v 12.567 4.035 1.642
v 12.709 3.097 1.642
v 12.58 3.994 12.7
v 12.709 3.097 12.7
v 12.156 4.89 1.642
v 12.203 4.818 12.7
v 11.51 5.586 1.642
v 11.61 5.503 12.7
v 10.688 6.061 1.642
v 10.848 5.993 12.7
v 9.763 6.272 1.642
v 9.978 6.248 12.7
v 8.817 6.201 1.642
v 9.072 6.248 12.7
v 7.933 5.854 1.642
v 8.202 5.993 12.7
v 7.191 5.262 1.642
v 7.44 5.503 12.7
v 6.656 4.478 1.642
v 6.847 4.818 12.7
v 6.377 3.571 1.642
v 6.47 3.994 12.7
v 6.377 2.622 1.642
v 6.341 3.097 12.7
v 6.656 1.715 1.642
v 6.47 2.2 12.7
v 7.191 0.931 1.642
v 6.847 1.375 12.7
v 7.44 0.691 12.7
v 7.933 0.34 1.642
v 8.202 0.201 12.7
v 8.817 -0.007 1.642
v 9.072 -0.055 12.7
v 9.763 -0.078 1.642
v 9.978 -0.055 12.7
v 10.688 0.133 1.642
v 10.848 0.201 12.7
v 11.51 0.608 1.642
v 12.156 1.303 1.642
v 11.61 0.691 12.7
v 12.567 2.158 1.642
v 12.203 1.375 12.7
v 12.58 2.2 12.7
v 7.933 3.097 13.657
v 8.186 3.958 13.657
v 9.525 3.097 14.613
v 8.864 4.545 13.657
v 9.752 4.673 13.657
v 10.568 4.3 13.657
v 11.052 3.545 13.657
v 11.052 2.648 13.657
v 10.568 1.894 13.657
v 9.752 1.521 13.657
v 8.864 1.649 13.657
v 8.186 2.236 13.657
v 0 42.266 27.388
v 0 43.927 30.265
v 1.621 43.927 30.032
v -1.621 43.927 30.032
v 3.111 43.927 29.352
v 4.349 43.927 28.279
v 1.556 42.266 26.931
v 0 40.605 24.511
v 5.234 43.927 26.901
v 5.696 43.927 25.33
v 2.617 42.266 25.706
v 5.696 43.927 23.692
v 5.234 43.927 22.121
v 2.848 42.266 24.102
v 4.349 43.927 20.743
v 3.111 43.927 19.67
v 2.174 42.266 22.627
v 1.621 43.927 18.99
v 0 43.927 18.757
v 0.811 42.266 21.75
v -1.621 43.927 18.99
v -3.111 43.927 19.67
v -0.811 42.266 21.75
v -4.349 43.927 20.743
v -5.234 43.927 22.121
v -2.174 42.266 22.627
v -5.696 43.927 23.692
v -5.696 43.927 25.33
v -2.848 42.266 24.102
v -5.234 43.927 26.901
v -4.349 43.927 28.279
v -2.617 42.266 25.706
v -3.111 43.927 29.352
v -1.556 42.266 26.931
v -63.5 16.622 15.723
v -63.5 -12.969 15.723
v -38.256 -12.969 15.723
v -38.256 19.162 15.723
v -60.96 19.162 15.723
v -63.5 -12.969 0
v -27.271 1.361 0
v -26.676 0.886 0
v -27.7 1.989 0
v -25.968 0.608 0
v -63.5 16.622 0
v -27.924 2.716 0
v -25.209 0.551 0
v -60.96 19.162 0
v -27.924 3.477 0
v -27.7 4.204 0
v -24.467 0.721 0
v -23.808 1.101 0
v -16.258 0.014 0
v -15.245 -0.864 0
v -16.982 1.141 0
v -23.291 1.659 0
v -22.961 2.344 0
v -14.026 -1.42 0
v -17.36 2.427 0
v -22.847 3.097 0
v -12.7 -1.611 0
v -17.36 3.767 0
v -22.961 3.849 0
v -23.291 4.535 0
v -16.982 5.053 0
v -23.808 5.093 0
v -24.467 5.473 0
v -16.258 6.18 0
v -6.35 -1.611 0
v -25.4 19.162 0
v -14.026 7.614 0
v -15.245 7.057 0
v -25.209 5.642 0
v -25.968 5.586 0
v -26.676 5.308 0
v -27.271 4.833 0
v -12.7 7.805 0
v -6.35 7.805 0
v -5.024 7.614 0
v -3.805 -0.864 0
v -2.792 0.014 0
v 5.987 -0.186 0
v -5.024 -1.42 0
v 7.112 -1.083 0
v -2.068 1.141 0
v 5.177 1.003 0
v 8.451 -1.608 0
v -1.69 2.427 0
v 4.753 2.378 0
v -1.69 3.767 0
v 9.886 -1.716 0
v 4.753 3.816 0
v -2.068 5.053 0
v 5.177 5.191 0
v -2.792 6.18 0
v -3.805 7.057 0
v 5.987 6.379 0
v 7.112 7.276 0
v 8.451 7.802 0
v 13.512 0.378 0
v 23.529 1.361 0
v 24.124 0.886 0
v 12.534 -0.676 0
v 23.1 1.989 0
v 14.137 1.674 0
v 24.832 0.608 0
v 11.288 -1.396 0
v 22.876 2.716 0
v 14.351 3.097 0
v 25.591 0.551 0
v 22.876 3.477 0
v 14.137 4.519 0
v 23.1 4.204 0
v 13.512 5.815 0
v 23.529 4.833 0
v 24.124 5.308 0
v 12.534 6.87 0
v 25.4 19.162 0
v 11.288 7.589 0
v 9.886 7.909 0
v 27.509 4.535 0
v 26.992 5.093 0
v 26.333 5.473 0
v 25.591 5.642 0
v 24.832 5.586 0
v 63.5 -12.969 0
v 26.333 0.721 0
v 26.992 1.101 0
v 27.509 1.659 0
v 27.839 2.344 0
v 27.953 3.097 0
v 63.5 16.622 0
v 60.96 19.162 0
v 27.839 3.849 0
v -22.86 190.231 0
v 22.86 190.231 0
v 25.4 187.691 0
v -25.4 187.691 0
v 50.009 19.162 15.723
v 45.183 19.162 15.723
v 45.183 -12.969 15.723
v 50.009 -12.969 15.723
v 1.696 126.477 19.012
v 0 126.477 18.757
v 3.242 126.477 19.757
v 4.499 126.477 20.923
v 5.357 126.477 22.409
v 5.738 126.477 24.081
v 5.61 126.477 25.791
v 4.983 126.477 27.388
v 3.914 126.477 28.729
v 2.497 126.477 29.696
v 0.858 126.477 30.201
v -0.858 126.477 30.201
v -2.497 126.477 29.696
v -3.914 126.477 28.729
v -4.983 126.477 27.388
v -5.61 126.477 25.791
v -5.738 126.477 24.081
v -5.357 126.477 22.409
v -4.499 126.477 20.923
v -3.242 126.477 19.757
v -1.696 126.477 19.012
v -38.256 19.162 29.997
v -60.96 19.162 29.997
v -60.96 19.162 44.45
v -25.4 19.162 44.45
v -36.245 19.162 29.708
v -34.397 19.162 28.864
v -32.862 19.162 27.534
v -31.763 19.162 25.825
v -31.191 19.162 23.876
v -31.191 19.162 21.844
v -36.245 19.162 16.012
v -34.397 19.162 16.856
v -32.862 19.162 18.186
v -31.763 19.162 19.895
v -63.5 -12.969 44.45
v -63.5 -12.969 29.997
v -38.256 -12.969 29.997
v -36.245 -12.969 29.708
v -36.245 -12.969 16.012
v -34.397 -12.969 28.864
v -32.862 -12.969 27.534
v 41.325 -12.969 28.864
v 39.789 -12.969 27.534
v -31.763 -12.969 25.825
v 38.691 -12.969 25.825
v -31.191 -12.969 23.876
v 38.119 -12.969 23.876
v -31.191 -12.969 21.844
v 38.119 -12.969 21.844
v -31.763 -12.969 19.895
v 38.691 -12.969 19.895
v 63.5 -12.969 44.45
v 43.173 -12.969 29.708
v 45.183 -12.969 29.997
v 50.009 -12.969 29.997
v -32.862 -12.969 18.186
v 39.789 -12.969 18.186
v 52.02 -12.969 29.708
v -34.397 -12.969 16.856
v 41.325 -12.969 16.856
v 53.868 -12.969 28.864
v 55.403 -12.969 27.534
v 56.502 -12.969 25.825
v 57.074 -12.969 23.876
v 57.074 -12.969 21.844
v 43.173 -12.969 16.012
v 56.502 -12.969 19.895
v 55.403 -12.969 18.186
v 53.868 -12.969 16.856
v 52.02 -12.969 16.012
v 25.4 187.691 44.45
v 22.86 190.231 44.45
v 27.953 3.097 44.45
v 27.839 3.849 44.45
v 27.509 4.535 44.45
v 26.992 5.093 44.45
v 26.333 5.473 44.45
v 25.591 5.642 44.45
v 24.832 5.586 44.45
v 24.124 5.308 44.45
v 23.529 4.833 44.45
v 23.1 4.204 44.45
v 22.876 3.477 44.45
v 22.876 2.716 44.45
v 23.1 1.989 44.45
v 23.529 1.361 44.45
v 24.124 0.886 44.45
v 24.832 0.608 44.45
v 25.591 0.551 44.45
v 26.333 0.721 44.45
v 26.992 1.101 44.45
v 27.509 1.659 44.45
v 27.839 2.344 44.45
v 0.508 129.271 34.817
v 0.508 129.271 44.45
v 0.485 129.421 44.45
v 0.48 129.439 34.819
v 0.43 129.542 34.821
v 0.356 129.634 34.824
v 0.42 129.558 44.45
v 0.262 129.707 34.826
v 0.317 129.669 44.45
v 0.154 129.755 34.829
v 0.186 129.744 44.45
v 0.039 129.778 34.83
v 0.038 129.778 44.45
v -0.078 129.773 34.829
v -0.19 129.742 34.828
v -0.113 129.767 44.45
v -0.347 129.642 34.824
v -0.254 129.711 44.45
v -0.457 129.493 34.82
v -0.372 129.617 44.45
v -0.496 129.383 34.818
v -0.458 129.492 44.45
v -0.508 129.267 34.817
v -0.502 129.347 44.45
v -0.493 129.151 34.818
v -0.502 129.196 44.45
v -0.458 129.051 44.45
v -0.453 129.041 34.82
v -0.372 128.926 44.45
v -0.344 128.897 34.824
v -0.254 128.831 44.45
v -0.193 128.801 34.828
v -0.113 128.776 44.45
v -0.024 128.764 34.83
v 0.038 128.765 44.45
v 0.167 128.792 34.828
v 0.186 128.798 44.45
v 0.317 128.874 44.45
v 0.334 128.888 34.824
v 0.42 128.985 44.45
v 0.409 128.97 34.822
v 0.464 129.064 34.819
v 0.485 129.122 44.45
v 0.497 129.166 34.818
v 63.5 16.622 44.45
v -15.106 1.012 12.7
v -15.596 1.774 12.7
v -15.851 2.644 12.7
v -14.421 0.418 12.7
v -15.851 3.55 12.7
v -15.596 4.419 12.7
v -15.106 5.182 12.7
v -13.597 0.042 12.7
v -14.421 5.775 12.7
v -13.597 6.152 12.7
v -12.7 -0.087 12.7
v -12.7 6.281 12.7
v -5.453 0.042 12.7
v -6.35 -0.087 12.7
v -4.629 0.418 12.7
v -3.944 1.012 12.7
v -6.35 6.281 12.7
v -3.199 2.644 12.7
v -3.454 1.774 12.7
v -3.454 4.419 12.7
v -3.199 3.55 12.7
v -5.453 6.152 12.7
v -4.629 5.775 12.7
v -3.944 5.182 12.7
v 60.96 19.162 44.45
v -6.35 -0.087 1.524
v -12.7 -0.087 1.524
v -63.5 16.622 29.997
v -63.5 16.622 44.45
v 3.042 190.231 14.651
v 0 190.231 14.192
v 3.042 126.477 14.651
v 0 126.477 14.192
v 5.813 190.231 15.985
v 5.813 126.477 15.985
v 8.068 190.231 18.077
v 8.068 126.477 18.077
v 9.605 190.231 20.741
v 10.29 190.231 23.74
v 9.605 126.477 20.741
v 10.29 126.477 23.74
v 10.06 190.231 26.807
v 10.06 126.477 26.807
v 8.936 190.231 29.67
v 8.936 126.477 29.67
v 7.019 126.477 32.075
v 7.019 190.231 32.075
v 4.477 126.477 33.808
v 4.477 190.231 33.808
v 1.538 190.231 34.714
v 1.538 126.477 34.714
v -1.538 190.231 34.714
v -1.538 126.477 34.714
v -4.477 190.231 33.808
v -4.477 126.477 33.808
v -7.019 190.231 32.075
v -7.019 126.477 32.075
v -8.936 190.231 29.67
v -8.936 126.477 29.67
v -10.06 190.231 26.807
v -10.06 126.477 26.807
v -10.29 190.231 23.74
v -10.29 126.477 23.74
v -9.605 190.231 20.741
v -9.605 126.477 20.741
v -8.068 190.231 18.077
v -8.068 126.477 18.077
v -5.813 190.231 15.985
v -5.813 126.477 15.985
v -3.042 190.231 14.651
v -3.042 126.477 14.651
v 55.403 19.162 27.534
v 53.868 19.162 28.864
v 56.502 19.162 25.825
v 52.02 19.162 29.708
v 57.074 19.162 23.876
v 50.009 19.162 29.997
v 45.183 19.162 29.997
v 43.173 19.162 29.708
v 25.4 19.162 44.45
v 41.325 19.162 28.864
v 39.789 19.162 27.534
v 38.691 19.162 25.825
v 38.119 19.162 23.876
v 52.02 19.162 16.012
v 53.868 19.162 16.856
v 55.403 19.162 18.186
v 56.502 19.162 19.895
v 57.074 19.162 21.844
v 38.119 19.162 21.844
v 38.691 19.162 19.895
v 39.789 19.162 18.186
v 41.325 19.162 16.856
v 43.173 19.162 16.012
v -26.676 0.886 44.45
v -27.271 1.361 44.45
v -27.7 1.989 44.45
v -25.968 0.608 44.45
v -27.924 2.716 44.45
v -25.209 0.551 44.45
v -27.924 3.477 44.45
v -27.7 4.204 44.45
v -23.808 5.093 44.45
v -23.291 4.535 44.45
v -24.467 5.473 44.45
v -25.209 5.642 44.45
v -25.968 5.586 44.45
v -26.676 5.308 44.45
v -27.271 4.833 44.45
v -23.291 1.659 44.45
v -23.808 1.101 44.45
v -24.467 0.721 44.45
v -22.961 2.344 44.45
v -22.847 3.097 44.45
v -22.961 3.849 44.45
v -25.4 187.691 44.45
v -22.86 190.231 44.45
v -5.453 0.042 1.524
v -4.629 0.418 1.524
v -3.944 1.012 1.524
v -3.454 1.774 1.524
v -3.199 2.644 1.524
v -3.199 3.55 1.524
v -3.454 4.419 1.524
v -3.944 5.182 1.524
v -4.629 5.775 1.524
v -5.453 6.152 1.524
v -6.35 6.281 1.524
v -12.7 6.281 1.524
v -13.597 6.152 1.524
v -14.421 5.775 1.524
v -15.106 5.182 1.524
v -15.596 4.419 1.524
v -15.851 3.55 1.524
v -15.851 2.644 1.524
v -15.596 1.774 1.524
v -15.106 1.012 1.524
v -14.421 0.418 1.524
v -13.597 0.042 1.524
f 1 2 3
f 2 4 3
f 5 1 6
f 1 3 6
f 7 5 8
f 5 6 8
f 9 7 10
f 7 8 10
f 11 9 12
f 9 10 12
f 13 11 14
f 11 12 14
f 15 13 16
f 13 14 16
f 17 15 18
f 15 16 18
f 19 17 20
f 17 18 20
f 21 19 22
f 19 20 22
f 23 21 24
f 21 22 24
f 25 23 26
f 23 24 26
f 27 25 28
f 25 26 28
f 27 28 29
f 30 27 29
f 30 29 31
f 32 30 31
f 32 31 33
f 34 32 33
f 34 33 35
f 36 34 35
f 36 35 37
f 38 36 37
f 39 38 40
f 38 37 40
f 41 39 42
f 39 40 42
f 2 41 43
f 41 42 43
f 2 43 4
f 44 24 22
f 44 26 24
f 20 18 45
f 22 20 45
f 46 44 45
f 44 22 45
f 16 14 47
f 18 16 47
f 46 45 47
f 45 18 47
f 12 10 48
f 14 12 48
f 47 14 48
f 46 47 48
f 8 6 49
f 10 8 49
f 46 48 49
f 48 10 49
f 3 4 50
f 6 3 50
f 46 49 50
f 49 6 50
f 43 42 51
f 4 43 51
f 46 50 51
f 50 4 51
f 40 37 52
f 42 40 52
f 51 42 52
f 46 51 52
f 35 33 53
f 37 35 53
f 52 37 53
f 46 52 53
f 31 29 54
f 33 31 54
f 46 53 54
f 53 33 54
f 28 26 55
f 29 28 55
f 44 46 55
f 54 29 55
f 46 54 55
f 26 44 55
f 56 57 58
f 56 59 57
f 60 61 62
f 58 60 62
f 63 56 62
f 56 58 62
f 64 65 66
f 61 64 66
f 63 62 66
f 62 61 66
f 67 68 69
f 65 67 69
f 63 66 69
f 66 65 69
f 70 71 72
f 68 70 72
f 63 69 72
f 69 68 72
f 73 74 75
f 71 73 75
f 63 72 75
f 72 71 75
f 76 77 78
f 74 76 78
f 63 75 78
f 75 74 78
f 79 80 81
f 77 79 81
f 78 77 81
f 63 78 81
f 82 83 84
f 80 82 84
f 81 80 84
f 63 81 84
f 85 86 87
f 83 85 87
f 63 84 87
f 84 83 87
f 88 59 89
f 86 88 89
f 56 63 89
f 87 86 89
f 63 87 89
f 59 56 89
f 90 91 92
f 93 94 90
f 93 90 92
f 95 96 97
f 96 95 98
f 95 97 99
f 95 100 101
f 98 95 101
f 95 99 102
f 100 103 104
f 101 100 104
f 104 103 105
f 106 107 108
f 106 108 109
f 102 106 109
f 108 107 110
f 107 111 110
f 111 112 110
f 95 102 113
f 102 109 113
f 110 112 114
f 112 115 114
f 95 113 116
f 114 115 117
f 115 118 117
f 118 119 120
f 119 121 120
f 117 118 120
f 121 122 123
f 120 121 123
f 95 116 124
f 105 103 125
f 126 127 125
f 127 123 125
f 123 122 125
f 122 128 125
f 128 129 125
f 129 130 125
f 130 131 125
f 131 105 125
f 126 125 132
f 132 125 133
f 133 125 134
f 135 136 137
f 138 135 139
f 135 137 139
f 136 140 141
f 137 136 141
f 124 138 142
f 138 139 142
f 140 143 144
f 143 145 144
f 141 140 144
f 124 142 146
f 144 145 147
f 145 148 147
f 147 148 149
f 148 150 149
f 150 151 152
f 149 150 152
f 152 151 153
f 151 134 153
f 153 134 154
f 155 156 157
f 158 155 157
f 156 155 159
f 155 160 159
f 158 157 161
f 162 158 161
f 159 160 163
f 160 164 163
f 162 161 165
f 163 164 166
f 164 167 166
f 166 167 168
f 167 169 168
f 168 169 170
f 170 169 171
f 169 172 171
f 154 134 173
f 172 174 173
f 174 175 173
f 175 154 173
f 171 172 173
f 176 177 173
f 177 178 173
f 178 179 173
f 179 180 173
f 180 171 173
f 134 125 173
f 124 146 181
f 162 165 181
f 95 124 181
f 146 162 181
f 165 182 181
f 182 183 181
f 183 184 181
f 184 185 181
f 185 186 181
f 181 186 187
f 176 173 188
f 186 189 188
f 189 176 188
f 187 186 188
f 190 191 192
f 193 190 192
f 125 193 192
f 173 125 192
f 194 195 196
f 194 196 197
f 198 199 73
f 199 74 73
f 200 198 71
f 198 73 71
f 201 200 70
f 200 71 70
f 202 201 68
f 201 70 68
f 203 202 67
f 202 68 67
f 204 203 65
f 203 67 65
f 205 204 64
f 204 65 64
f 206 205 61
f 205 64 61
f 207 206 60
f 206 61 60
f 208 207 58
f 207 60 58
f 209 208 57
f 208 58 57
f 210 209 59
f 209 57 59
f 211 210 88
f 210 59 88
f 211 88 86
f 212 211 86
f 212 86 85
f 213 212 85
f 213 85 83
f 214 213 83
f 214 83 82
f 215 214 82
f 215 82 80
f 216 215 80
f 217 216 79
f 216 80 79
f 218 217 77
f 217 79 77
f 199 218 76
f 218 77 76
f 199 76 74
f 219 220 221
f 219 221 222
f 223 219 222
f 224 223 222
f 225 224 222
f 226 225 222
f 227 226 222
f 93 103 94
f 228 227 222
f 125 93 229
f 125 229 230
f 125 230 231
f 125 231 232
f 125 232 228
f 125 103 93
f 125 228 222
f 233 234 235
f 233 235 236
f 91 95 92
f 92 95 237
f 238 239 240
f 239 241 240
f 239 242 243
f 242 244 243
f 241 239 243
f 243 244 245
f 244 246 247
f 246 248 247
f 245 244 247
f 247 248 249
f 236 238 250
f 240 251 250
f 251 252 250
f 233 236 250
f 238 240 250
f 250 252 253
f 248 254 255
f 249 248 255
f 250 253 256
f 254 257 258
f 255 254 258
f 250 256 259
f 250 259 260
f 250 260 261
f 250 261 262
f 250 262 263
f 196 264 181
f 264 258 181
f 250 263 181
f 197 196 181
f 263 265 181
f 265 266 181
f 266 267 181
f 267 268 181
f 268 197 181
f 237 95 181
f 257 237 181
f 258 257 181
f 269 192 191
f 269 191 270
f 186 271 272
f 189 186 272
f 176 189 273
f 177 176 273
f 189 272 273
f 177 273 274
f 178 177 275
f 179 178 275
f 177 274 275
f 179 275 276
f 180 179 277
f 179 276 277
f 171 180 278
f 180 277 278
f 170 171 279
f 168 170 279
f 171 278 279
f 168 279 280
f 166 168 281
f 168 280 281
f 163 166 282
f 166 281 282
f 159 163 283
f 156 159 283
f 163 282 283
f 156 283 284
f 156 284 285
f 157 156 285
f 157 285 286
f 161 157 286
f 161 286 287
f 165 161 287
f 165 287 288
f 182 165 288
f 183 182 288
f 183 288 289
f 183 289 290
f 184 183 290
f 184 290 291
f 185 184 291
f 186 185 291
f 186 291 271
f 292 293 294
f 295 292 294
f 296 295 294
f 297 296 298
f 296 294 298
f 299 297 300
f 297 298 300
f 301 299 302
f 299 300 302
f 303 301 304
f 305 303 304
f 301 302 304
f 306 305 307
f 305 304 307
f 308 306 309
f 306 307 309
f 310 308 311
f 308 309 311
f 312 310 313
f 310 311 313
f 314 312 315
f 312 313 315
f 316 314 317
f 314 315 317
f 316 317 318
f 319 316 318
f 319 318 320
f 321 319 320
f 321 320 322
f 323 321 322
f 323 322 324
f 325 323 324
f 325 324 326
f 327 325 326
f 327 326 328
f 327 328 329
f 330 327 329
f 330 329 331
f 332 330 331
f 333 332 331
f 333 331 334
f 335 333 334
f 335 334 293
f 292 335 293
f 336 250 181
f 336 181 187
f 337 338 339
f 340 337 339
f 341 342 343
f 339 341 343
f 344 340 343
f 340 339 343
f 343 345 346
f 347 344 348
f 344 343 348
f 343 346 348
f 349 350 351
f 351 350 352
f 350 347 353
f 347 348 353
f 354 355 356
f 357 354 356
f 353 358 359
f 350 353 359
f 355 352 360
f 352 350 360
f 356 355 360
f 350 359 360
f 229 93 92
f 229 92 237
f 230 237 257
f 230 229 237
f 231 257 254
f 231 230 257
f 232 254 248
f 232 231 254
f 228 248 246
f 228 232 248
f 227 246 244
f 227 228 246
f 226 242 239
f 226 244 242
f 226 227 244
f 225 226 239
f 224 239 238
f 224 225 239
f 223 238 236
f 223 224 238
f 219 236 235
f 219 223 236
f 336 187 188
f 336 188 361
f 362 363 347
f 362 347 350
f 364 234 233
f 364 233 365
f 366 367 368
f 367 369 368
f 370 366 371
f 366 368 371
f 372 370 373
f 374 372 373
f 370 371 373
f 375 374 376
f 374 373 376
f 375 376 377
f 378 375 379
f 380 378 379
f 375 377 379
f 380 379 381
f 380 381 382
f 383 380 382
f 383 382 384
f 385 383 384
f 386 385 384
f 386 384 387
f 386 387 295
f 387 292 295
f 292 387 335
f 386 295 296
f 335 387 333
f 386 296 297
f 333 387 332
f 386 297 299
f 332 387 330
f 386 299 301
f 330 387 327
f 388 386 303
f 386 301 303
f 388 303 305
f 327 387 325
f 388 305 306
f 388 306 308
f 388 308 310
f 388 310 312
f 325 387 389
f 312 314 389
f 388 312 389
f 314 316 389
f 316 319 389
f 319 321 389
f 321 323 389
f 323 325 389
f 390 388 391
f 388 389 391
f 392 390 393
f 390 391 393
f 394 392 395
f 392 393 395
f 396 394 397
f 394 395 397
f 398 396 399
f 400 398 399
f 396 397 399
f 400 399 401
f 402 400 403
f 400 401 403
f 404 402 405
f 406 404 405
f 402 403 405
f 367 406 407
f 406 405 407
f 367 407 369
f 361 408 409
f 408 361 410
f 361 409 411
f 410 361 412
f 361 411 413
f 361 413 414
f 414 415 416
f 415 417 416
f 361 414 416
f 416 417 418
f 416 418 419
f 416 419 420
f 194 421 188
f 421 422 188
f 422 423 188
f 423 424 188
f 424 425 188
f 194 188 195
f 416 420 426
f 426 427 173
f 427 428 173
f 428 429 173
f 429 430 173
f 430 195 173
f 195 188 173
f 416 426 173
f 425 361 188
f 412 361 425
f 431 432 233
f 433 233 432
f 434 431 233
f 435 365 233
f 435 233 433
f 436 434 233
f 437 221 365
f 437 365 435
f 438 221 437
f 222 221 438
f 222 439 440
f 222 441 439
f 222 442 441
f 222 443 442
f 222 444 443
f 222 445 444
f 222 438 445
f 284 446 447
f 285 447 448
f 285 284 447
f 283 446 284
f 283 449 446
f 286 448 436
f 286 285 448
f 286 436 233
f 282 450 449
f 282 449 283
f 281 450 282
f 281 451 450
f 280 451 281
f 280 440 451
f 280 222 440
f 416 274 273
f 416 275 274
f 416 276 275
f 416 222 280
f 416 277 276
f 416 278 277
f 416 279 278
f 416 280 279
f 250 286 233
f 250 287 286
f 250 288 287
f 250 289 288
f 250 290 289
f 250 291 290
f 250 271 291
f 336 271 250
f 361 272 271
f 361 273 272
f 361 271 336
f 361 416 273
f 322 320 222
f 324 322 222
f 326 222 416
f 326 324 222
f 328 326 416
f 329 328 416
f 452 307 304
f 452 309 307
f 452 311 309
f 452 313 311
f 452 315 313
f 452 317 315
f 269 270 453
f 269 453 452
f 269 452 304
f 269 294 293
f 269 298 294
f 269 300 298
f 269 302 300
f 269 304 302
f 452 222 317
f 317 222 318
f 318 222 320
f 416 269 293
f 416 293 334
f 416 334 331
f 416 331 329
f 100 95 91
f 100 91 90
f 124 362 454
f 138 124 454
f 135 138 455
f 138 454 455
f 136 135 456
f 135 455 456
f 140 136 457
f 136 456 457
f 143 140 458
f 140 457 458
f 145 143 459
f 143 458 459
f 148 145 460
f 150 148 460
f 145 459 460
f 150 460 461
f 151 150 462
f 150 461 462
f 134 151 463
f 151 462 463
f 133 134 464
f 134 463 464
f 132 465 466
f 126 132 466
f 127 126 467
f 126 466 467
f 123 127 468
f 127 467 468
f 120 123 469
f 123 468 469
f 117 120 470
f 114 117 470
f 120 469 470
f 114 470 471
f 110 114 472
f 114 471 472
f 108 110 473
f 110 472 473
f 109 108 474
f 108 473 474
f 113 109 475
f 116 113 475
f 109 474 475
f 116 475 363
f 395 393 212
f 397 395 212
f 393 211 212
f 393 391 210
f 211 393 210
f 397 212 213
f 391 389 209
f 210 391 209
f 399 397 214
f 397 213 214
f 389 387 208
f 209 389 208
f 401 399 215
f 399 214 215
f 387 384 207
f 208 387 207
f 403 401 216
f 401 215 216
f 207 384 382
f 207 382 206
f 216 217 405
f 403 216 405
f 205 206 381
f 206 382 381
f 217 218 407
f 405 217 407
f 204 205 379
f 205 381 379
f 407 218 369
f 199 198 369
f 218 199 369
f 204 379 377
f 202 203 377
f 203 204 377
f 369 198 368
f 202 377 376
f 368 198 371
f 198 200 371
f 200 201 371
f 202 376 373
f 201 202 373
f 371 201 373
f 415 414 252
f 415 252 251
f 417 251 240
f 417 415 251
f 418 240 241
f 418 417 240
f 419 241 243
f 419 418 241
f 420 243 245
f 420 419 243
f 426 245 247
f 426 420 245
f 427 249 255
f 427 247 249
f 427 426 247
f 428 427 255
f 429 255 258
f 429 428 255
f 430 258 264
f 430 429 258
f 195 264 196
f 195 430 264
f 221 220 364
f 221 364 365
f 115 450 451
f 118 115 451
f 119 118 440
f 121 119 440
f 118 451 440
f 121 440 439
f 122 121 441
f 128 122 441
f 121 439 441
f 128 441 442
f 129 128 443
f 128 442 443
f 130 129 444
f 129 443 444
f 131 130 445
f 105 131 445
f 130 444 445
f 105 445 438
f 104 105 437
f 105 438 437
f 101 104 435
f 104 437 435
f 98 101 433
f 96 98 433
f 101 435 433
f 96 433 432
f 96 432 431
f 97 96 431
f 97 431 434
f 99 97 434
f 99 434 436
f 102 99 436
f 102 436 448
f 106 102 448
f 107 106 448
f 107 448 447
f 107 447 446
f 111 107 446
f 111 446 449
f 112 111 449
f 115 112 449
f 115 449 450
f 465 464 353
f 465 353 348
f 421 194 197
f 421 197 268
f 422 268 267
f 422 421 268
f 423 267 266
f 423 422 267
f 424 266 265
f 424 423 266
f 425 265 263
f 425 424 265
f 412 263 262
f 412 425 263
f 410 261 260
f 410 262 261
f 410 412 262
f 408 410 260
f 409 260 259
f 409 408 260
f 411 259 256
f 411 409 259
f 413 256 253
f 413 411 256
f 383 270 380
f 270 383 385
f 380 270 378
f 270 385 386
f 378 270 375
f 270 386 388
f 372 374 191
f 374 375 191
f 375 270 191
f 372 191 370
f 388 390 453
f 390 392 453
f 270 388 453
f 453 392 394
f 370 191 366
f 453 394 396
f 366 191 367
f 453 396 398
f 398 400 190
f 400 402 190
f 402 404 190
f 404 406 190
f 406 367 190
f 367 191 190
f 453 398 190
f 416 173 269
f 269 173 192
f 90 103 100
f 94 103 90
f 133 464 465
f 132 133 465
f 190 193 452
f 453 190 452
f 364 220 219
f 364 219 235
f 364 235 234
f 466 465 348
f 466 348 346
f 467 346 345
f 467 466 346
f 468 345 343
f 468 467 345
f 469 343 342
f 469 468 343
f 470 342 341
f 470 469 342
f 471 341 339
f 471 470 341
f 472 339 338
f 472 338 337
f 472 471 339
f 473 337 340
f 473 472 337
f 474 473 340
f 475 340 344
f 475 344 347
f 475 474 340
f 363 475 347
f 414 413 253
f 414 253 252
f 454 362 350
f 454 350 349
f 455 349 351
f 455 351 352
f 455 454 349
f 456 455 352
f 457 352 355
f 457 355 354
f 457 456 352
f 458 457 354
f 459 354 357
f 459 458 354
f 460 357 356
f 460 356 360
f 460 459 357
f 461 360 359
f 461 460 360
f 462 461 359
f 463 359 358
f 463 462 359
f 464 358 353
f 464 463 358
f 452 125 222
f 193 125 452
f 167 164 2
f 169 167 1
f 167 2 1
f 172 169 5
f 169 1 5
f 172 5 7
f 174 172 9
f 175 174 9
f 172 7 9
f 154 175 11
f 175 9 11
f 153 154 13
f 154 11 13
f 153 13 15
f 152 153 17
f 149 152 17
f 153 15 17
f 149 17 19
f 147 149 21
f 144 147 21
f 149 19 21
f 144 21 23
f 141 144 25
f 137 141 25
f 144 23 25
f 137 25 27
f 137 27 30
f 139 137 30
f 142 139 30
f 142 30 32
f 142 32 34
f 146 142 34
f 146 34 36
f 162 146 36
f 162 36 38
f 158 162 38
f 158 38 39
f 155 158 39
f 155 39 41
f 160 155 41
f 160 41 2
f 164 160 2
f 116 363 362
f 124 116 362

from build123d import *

# Parameters (mm, degrees)
EXTRUDE1_DEPTH                        = 44.45
CHAMFER1_SIZE                         = 2.54
CHAMFER2_SIZE                         = 2.54
F_13_16_0_8125_DIAMETER_HOLE1_D       = 20.6375
F_13_16_0_8125_DIAMETER_HOLE1_DEPTH   = 63.754
F_1_2_20_TAPPED_HOLE1_D               = 11.50874
F_1_2_20_TAPPED_HOLE1_DEPTH           = 82.55
F_1_2_20_TAPPED_HOLE1_TIP             = 3.322287069
F_60_0_04_DIAMETER_HOLE1_REACH        = 46.45
F_60_0_04_DIAMETER_HOLE1_BORE_R       = 0.508
F_1_4_20_TAPPED_HOLE1_D               = 5.1054
F_1_4_0_25_DIAMETER_HOLE2_D           = 6.36778
F_1_4_0_25_DIAMETER_HOLE2_DEPTH       = 12.7
F_1_4_0_25_DIAMETER_HOLE2_CSINK_D     = 9.652
F_1_4_0_25_DIAMETER_HOLE2_CSINK_ANGLE = 90
F_1_4_0_25_DIAMETER_HOLE2_TIP         = 1.913074116
EXTRUDE4_DEPTH                        = 12.7
CHAMFER3_SIZE                         = 1.524
EXTRUDE5_DEPTH                        = 33.131


with BuildPart() as part:
    # Sketch1 → Extrude1 (new body)
    with BuildSketch(Plane.XY):
        Polygon((-63.5, 19.16234013), (-25.4, 19.16234013), (-25.4, 190.23134013), (0, 190.23134013), (0, -12.96865987), (-63.5, -12.96865987), align=None)
    extrude1 = extrude(amount=EXTRUDE1_DEPTH)

    # Mirror2: Extrude1 across plane
    add(extrude1.mirror(Plane(origin=(0, -12.96865987, 44.45), x_dir=(0, 0, 1), z_dir=(-1, 0, 0))))

    # Chamfer1
    chamfer1_edges = [part.edges().sort_by_distance(p)[0] for p in [
        (63.5, 19.16234013, 22.225),
        (25.4, 190.23134013, 22.225),
    ]]
    chamfer(chamfer1_edges, length=CHAMFER1_SIZE)

    # Chamfer2
    chamfer2_edges = [part.edges().sort_by_distance(p)[0] for p in [
        (-63.5, 19.16234013, 22.225),
        (-25.4, 190.23134013, 22.225),
    ]]
    chamfer(chamfer2_edges, length=CHAMFER2_SIZE)

    # 13/16 (0.8125) Diameter Hole1
    with Locations(Plane(origin=(0, 190.23134013, 24.511), x_dir=(0, 0, 1), z_dir=(0, 1, 0))):
        with Locations((0, 0)):
            Hole(F_13_16_0_8125_DIAMETER_HOLE1_D / 2, depth=F_13_16_0_8125_DIAMETER_HOLE1_DEPTH)

    # 1/2-20 Tapped Hole1
    with Locations(Plane(origin=(0, 126.47734013, 24.511), x_dir=(0, 0, 1), z_dir=(0, 1, 0))):
        with Locations((0, 0)):
            Hole(F_1_2_20_TAPPED_HOLE1_D / 2, depth=F_1_2_20_TAPPED_HOLE1_DEPTH)
            with Locations((0, 0, -(F_1_2_20_TAPPED_HOLE1_DEPTH + F_1_2_20_TAPPED_HOLE1_TIP / 2))):  # 120° drill point
                Cone(0, F_1_2_20_TAPPED_HOLE1_D / 2, F_1_2_20_TAPPED_HOLE1_TIP, mode=Mode.SUBTRACT)

    # #60 (0.04) Diameter Hole1 bore → #60 (0.04) Diameter Hole1 (cut, up to next)
    with BuildSketch(Plane.XY.offset(44.45), mode=Mode.PRIVATE) as f_60_0_04_diameter_hole1_sk1:
        with Locations((0, 129.27134013)):
            Circle(F_60_0_04_DIAMETER_HOLE1_BORE_R)
    f_60_0_04_diameter_hole1_tool1 = extrude(f_60_0_04_diameter_hole1_sk1.sketch, amount=-F_60_0_04_DIAMETER_HOLE1_REACH, mode=Mode.PRIVATE) & part.part
    add(f_60_0_04_diameter_hole1_tool1.solids().sort_by_distance((0, 129.27134, 44.45))[0], mode=Mode.SUBTRACT)

    # 1/4-20 Tapped Hole1 (through all)
    with Locations(Plane(origin=(0, 0, 0), x_dir=(-1, 0, 0), z_dir=(0, 0, -1))):
        with Locations((-25.4, 3.09684013), (25.4, 3.09684013)):
            Hole(F_1_4_20_TAPPED_HOLE1_D / 2)

    # 1/4 (0.25) Diameter Hole2
    with Locations(Plane(origin=(0, 0, 0), x_dir=(-1, 0, 0), z_dir=(0, 0, -1))):
        with Locations((-9.525, 3.09684013)):
            CounterSinkHole(F_1_4_0_25_DIAMETER_HOLE2_D / 2, F_1_4_0_25_DIAMETER_HOLE2_CSINK_D / 2, depth=F_1_4_0_25_DIAMETER_HOLE2_DEPTH, counter_sink_angle=F_1_4_0_25_DIAMETER_HOLE2_CSINK_ANGLE)
            with Locations((0, 0, -(F_1_4_0_25_DIAMETER_HOLE2_DEPTH + F_1_4_0_25_DIAMETER_HOLE2_TIP / 2))):  # 118° drill point
                Cone(0, F_1_4_0_25_DIAMETER_HOLE2_D / 2, F_1_4_0_25_DIAMETER_HOLE2_TIP, mode=Mode.SUBTRACT)

    # Sketch23 → Extrude4 (cut)
    with BuildSketch(Plane(origin=(0, 0, 0), x_dir=(-1, 0, 0), z_dir=(0, 0, -1))):
        with BuildLine():
            Line((6.35, 6.28073013), (12.7, 6.28073013))
            ThreePointArc((12.7, 6.28073013), (15.88389, 3.09684013), (12.7, -0.08704987))
            Line((12.7, -0.08704987), (6.35, -0.08704987))
            ThreePointArc((6.35, -0.08704987), (3.16611, 3.09684013), (6.35, 6.28073013))
        make_face()
    extrude(amount=-EXTRUDE4_DEPTH, mode=Mode.SUBTRACT)

    # Chamfer3
    chamfer3_edges = [part.edges().sort_by_distance(p)[0] for p in [
        (-3.16611, 3.09684013, 0),
        (-9.525, -0.08704987, 0),
        (-15.88389, 3.09684013, 0),
        (-9.525, 6.28073013, 0),
    ]]
    chamfer(chamfer3_edges, length=CHAMFER3_SIZE)

    # Sketch24 → Extrude5 (cut, through all)
    with BuildSketch(Plane(origin=(0, 19.16234013, 0), x_dir=(1, 0, 0), z_dir=(0, 1, 0))):
        with BuildLine():
            Line((45.183374064, -15.7226), (50.009374064, -15.7226))
            ThreePointArc((50.009374064, -15.7226), (57.146774064, -22.86), (50.009374064, -29.9974))
            Line((50.009374064, -29.9974), (45.183374064, -29.9974))
            ThreePointArc((45.183374064, -29.9974), (38.045974064, -22.86), (45.183374064, -15.7226))
        make_face()
        with BuildLine():
            Line((-38.255625936, -29.9974), (-63.655625936, -29.9974))
            ThreePointArc((-63.655625936, -29.9974), (-70.793025936, -22.86), (-63.655625936, -15.7226))
            Line((-63.655625936, -15.7226), (-38.255625936, -15.7226))
            ThreePointArc((-38.255625936, -15.7226), (-31.118225936, -22.86), (-38.255625936, -29.9974))
        make_face()
    extrude(amount=-EXTRUDE5_DEPTH, mode=Mode.SUBTRACT)


solid = part.part
